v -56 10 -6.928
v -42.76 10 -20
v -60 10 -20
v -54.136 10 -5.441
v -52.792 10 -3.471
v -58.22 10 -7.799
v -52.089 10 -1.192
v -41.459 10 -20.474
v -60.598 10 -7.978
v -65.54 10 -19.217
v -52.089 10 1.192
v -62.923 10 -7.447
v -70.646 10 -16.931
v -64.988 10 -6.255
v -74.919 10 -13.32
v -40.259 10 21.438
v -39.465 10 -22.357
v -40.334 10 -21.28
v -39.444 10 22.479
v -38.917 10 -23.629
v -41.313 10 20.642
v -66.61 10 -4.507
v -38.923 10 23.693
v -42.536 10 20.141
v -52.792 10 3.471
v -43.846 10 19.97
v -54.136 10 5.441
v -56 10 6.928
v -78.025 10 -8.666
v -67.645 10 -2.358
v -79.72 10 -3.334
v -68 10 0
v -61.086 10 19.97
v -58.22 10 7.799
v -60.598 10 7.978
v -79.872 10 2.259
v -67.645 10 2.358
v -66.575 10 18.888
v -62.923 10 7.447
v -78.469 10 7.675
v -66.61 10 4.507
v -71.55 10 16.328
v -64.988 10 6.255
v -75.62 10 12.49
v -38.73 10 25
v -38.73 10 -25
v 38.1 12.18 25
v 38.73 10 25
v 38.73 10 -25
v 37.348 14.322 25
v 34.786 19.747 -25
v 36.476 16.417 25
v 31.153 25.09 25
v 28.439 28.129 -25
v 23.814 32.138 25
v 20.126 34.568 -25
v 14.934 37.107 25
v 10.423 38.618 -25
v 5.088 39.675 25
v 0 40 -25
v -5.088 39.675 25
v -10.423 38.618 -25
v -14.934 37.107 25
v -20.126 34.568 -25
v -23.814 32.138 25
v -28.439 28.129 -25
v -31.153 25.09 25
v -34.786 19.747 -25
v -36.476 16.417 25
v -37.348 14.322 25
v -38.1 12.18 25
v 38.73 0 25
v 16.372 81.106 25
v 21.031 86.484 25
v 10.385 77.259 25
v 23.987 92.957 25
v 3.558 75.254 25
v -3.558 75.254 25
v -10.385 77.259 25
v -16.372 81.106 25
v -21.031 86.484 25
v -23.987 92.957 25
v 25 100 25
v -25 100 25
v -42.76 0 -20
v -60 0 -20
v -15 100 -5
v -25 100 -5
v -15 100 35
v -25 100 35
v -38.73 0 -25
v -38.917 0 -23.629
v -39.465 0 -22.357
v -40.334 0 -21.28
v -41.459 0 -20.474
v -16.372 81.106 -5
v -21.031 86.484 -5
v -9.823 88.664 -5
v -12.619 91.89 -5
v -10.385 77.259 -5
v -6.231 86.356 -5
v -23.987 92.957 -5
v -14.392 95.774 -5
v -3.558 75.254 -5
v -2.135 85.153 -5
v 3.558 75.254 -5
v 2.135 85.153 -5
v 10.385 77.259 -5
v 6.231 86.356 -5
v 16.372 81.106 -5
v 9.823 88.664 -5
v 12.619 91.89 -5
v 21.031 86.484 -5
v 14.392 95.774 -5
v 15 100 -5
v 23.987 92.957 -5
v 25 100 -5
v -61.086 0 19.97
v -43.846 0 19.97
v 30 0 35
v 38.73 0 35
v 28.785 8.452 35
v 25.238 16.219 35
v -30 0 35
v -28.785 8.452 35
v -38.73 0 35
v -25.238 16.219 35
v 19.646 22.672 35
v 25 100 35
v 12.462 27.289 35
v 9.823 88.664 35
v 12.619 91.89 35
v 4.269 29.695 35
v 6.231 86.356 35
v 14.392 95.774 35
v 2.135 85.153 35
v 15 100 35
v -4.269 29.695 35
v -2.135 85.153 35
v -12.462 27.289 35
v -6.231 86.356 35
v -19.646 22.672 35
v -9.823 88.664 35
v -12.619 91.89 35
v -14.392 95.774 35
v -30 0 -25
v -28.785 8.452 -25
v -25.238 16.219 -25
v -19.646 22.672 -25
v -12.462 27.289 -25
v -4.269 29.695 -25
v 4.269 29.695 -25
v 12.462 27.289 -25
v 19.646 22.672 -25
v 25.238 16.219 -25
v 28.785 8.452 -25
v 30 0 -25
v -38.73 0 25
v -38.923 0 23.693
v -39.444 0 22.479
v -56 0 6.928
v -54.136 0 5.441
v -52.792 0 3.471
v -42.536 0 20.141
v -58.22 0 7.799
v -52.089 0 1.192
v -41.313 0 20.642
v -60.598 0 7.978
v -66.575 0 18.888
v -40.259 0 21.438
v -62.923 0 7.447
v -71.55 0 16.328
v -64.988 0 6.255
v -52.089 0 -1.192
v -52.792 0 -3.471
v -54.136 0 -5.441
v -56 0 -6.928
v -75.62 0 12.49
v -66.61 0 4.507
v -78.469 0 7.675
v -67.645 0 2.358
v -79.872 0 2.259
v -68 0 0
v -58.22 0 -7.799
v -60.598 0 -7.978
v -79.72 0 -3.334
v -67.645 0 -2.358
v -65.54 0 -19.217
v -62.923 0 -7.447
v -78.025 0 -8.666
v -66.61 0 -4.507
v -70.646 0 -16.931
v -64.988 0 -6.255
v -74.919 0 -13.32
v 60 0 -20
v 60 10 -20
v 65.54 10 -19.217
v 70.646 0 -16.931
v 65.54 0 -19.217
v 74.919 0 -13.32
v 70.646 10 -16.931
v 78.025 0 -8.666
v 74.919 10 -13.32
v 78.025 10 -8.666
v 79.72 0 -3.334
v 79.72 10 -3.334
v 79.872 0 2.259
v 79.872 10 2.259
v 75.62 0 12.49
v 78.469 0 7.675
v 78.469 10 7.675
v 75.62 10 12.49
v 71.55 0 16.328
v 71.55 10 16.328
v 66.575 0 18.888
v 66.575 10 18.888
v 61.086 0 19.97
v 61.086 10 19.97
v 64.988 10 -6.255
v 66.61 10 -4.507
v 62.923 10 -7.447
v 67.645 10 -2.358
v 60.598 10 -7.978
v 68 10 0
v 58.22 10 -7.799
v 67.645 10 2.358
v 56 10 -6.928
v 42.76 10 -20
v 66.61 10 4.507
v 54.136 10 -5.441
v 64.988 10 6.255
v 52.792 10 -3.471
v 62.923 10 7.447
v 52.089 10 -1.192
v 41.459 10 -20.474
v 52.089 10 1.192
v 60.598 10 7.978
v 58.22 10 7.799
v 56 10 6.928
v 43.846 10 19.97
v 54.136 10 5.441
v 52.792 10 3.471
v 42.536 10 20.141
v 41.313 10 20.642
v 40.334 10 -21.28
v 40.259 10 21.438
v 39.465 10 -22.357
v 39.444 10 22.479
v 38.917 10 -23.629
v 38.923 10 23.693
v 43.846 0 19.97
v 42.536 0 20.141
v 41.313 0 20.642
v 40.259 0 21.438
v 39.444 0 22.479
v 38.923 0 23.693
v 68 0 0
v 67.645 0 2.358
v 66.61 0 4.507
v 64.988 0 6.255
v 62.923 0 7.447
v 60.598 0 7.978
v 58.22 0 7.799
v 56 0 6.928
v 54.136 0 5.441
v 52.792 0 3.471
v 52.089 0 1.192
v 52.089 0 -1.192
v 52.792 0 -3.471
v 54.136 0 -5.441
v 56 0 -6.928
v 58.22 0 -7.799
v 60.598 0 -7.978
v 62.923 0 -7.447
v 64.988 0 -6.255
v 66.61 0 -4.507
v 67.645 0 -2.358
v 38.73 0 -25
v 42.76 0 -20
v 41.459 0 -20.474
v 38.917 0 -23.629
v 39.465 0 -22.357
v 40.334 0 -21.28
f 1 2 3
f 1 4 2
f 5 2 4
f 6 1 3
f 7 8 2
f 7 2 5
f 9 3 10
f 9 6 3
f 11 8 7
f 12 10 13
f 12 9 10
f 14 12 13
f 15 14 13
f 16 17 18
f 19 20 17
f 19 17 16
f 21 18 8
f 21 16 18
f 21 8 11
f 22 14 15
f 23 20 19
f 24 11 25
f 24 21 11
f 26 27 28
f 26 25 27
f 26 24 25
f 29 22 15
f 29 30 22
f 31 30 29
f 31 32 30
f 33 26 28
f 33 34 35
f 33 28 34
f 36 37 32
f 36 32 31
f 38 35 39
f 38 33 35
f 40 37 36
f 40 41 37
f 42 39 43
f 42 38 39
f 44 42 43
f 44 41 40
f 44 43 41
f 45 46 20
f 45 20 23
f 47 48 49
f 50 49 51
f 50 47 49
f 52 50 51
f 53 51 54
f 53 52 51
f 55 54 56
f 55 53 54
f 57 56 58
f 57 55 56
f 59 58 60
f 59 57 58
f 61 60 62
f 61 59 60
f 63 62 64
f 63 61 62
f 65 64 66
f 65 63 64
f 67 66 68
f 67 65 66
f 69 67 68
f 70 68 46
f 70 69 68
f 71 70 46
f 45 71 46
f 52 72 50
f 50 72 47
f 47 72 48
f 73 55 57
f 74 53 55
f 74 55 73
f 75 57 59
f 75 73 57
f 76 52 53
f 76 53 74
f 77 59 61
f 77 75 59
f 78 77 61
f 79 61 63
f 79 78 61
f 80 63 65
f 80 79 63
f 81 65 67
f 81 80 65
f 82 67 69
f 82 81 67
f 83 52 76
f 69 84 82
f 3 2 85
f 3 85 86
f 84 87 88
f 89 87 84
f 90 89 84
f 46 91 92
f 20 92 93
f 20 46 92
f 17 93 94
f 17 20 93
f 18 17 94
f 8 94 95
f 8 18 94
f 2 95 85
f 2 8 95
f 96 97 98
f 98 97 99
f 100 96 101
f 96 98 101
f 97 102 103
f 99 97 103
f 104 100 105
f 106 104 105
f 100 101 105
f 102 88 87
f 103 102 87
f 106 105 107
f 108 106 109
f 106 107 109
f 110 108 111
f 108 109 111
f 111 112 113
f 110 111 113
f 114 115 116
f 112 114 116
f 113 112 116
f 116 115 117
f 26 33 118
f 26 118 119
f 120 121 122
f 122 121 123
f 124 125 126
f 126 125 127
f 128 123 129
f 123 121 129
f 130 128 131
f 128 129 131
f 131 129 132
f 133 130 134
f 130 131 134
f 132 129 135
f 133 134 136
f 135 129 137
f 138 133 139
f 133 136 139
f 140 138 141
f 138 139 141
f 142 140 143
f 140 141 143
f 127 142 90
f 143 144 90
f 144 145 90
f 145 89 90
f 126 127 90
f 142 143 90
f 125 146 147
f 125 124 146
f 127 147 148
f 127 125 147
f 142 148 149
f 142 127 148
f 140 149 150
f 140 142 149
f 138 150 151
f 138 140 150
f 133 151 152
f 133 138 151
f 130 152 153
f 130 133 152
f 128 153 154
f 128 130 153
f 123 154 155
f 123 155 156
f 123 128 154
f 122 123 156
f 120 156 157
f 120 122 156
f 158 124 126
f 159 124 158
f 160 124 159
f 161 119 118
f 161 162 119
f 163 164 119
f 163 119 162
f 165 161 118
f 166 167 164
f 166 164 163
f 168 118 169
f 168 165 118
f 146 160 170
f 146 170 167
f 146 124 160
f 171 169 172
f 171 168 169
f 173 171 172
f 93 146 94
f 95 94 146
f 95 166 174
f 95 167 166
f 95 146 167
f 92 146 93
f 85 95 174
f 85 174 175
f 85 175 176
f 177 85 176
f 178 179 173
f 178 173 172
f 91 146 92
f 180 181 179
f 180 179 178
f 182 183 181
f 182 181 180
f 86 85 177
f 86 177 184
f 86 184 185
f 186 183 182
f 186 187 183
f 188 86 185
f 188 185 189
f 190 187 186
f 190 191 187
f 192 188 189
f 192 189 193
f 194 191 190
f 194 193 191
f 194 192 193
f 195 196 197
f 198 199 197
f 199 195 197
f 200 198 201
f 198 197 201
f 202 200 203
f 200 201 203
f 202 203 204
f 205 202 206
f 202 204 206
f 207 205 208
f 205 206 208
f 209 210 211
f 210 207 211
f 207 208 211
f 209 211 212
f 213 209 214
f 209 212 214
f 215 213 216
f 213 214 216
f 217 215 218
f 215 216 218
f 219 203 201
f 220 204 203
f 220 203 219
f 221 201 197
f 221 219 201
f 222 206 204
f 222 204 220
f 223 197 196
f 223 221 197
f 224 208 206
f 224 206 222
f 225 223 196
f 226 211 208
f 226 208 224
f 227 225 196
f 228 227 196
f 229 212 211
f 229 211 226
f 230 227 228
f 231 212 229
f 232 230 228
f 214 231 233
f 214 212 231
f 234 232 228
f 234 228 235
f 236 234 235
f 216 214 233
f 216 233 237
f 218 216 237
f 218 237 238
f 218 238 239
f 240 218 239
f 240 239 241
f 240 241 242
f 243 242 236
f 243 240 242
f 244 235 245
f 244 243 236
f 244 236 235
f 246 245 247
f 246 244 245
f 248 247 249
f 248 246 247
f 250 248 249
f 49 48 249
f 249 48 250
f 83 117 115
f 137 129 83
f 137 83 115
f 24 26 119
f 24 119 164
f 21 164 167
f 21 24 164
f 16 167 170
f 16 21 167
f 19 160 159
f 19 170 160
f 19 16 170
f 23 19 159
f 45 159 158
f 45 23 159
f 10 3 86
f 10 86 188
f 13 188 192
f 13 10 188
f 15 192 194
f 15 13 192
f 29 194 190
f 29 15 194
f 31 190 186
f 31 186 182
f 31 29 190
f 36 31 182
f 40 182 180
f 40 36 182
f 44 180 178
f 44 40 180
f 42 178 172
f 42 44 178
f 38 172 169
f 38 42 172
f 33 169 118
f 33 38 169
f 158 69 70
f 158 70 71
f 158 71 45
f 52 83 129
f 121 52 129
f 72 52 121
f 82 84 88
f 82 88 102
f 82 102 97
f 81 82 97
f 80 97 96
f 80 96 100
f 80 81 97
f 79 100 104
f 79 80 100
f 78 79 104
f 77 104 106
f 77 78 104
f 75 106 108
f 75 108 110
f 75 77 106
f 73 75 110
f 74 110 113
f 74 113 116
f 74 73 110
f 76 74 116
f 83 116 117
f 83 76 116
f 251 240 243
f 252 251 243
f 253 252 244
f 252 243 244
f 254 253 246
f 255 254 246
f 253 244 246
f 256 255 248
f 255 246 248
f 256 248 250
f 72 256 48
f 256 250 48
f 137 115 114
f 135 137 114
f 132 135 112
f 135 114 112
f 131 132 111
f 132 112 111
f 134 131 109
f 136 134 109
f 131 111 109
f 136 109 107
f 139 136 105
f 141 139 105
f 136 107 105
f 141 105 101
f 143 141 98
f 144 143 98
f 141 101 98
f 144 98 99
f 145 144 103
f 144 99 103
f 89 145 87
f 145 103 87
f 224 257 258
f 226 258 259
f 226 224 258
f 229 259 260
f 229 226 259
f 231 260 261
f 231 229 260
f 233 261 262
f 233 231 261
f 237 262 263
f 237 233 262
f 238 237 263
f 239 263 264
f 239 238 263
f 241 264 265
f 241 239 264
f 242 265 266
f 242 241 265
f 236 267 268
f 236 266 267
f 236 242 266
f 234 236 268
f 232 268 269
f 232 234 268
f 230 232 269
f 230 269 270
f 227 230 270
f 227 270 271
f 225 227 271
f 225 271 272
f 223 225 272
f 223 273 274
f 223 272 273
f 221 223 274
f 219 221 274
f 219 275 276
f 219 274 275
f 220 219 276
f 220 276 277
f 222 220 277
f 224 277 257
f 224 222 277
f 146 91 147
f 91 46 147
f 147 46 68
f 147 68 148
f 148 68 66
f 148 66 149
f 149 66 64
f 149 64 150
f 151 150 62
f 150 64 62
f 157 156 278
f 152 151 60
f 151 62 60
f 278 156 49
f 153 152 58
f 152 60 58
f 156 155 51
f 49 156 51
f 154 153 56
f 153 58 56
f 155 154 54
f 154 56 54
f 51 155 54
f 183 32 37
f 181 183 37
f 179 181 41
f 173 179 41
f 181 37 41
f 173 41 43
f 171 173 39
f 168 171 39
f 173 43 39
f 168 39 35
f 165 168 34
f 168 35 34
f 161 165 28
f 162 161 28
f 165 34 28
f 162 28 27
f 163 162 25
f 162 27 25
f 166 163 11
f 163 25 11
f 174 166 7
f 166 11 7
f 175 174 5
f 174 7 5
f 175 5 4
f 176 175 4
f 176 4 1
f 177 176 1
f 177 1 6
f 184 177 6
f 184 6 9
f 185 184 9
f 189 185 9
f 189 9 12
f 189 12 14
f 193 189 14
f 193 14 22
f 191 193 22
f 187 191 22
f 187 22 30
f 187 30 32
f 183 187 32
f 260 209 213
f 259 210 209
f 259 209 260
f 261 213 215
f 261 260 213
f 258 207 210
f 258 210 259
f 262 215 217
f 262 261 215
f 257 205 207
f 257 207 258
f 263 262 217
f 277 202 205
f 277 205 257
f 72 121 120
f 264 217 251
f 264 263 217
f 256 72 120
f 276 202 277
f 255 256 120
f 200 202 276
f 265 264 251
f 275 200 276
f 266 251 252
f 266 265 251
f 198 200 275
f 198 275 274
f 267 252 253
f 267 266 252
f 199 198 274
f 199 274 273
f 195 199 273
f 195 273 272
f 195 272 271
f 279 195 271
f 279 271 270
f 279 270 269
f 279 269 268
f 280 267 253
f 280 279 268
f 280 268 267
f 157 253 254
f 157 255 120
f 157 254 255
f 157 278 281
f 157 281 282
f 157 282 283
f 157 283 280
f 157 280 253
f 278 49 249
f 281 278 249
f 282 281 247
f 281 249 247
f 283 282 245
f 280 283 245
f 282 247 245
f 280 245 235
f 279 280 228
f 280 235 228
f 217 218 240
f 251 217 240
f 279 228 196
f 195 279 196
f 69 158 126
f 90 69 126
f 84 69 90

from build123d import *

# Parameters (mm, degrees)
BOSS_EXTRUDE1_DEPTH = 25
SKETCH2_R           = 8
CUT_EXTRUDE1_DEPTH  = 11
BOSS_EXTRUDE2_DEPTH = 10
CUT_EXTRUDE2_DEPTH  = 11
BOSS_EXTRUDE3_DEPTH = 30
CUT_EXTRUDE4_DEPTH  = 41


with BuildPart() as part:
    # Sketch1 → Boss-Extrude1 (new body, symmetric)
    with BuildSketch(Plane.XY):
        with BuildLine():
            Line((30, 0), (90, 0))
            Line((90, 0), (90, 10))
            Line((90, 10), (38.729833462, 10))
            ThreePointArc((38.729833462, 10), (0, 40), (-38.729833462, 10))
            Line((-38.729833462, 10), (-90, 10))
            Line((-90, 10), (-90, 0))
            Line((-90, 0), (-30, 0))
            ThreePointArc((-30, 0), (0, 30), (30, 0))
        make_face()
    extrude(amount=BOSS_EXTRUDE1_DEPTH, both=True)

    # Sketch2 → Cut-Extrude1 (cut, through all)
    with BuildSketch(Plane(origin=(0, 10, 0), x_dir=(1, 0, 0), z_dir=(0, 1, 0))):
        with Locations(Location((-60, 0, 0), (0, 0, 180))):  # turned: the seam where the file's is
            Circle(SKETCH2_R)
        with BuildLine():
            Line((-42.759901773, 20), (-60, 20))
            ThreePointArc((-60, 20), (-79.992623239, 0.543153766), (-61.08590686, -19.970498399))
            Line((-61.08590686, -19.970498399), (-43.845808633, -19.970498399))
            ThreePointArc((-43.845808633, -19.970498399), (-40.258710631, -21.438445011), (-38.729833462, -25))
            Line((-38.729833462, -25), (-90, -25))
            Line((-90, -25), (-90, 25))
            Line((-90, 25), (-38.729833462, 25))
            ThreePointArc((-38.729833462, 25), (-39.862779167, 21.789024658), (-42.759901773, 20))
        make_face()
    cut_extrude1 = extrude(amount=-CUT_EXTRUDE1_DEPTH, mode=Mode.SUBTRACT)

    # Mirror1: Cut-Extrude1 across plane
    add(cut_extrude1.mirror(Plane(origin=(0, 0, 0), x_dir=(0, 0, 1), z_dir=(1, 0, 0))), mode=Mode.SUBTRACT)

    # Sketch3 → Boss-Extrude2 (add)
    with BuildSketch(Plane.XY.offset(25)):
        Polygon((38.729833462, 0), (-38.729833462, 0), (-25, 100), (25, 100), align=None)
    extrude(amount=BOSS_EXTRUDE2_DEPTH)

    # Sketch5 → Cut-Extrude2 (cut, through all)
    with BuildSketch(Plane(origin=(0, 0, 25), x_dir=(-1, 0, 0), z_dir=(0, 0, -1))):
        with BuildLine():
            ThreePointArc((30, 0), (0, 30), (-30, 0))
            Line((-30, 0), (30, 0))
        make_face()
    extrude(amount=-CUT_EXTRUDE2_DEPTH, mode=Mode.SUBTRACT)

    # Sketch10 → Boss-Extrude3 (add)
    with BuildSketch(Plane(origin=(0, 0, 25), x_dir=(-1, 0, 0), z_dir=(0, 0, -1))):
        with BuildLine():
            Line((-25, 100), (25, 100))
            ThreePointArc((25, 100), (0, 75), (-25, 100))
        make_face()
    extrude(amount=BOSS_EXTRUDE3_DEPTH)

    # Sketch11 → Cut-Extrude4 (cut, through all)
    with BuildSketch(Plane(origin=(0, 0, -5), x_dir=(-1, 0, 0), z_dir=(0, 0, -1))):
        with BuildLine():
            Line((15, 100), (-15, 100))
            ThreePointArc((-15, 100), (0, 85), (15, 100))
        make_face()
    extrude(amount=-CUT_EXTRUDE4_DEPTH, mode=Mode.SUBTRACT)


solid = part.part
